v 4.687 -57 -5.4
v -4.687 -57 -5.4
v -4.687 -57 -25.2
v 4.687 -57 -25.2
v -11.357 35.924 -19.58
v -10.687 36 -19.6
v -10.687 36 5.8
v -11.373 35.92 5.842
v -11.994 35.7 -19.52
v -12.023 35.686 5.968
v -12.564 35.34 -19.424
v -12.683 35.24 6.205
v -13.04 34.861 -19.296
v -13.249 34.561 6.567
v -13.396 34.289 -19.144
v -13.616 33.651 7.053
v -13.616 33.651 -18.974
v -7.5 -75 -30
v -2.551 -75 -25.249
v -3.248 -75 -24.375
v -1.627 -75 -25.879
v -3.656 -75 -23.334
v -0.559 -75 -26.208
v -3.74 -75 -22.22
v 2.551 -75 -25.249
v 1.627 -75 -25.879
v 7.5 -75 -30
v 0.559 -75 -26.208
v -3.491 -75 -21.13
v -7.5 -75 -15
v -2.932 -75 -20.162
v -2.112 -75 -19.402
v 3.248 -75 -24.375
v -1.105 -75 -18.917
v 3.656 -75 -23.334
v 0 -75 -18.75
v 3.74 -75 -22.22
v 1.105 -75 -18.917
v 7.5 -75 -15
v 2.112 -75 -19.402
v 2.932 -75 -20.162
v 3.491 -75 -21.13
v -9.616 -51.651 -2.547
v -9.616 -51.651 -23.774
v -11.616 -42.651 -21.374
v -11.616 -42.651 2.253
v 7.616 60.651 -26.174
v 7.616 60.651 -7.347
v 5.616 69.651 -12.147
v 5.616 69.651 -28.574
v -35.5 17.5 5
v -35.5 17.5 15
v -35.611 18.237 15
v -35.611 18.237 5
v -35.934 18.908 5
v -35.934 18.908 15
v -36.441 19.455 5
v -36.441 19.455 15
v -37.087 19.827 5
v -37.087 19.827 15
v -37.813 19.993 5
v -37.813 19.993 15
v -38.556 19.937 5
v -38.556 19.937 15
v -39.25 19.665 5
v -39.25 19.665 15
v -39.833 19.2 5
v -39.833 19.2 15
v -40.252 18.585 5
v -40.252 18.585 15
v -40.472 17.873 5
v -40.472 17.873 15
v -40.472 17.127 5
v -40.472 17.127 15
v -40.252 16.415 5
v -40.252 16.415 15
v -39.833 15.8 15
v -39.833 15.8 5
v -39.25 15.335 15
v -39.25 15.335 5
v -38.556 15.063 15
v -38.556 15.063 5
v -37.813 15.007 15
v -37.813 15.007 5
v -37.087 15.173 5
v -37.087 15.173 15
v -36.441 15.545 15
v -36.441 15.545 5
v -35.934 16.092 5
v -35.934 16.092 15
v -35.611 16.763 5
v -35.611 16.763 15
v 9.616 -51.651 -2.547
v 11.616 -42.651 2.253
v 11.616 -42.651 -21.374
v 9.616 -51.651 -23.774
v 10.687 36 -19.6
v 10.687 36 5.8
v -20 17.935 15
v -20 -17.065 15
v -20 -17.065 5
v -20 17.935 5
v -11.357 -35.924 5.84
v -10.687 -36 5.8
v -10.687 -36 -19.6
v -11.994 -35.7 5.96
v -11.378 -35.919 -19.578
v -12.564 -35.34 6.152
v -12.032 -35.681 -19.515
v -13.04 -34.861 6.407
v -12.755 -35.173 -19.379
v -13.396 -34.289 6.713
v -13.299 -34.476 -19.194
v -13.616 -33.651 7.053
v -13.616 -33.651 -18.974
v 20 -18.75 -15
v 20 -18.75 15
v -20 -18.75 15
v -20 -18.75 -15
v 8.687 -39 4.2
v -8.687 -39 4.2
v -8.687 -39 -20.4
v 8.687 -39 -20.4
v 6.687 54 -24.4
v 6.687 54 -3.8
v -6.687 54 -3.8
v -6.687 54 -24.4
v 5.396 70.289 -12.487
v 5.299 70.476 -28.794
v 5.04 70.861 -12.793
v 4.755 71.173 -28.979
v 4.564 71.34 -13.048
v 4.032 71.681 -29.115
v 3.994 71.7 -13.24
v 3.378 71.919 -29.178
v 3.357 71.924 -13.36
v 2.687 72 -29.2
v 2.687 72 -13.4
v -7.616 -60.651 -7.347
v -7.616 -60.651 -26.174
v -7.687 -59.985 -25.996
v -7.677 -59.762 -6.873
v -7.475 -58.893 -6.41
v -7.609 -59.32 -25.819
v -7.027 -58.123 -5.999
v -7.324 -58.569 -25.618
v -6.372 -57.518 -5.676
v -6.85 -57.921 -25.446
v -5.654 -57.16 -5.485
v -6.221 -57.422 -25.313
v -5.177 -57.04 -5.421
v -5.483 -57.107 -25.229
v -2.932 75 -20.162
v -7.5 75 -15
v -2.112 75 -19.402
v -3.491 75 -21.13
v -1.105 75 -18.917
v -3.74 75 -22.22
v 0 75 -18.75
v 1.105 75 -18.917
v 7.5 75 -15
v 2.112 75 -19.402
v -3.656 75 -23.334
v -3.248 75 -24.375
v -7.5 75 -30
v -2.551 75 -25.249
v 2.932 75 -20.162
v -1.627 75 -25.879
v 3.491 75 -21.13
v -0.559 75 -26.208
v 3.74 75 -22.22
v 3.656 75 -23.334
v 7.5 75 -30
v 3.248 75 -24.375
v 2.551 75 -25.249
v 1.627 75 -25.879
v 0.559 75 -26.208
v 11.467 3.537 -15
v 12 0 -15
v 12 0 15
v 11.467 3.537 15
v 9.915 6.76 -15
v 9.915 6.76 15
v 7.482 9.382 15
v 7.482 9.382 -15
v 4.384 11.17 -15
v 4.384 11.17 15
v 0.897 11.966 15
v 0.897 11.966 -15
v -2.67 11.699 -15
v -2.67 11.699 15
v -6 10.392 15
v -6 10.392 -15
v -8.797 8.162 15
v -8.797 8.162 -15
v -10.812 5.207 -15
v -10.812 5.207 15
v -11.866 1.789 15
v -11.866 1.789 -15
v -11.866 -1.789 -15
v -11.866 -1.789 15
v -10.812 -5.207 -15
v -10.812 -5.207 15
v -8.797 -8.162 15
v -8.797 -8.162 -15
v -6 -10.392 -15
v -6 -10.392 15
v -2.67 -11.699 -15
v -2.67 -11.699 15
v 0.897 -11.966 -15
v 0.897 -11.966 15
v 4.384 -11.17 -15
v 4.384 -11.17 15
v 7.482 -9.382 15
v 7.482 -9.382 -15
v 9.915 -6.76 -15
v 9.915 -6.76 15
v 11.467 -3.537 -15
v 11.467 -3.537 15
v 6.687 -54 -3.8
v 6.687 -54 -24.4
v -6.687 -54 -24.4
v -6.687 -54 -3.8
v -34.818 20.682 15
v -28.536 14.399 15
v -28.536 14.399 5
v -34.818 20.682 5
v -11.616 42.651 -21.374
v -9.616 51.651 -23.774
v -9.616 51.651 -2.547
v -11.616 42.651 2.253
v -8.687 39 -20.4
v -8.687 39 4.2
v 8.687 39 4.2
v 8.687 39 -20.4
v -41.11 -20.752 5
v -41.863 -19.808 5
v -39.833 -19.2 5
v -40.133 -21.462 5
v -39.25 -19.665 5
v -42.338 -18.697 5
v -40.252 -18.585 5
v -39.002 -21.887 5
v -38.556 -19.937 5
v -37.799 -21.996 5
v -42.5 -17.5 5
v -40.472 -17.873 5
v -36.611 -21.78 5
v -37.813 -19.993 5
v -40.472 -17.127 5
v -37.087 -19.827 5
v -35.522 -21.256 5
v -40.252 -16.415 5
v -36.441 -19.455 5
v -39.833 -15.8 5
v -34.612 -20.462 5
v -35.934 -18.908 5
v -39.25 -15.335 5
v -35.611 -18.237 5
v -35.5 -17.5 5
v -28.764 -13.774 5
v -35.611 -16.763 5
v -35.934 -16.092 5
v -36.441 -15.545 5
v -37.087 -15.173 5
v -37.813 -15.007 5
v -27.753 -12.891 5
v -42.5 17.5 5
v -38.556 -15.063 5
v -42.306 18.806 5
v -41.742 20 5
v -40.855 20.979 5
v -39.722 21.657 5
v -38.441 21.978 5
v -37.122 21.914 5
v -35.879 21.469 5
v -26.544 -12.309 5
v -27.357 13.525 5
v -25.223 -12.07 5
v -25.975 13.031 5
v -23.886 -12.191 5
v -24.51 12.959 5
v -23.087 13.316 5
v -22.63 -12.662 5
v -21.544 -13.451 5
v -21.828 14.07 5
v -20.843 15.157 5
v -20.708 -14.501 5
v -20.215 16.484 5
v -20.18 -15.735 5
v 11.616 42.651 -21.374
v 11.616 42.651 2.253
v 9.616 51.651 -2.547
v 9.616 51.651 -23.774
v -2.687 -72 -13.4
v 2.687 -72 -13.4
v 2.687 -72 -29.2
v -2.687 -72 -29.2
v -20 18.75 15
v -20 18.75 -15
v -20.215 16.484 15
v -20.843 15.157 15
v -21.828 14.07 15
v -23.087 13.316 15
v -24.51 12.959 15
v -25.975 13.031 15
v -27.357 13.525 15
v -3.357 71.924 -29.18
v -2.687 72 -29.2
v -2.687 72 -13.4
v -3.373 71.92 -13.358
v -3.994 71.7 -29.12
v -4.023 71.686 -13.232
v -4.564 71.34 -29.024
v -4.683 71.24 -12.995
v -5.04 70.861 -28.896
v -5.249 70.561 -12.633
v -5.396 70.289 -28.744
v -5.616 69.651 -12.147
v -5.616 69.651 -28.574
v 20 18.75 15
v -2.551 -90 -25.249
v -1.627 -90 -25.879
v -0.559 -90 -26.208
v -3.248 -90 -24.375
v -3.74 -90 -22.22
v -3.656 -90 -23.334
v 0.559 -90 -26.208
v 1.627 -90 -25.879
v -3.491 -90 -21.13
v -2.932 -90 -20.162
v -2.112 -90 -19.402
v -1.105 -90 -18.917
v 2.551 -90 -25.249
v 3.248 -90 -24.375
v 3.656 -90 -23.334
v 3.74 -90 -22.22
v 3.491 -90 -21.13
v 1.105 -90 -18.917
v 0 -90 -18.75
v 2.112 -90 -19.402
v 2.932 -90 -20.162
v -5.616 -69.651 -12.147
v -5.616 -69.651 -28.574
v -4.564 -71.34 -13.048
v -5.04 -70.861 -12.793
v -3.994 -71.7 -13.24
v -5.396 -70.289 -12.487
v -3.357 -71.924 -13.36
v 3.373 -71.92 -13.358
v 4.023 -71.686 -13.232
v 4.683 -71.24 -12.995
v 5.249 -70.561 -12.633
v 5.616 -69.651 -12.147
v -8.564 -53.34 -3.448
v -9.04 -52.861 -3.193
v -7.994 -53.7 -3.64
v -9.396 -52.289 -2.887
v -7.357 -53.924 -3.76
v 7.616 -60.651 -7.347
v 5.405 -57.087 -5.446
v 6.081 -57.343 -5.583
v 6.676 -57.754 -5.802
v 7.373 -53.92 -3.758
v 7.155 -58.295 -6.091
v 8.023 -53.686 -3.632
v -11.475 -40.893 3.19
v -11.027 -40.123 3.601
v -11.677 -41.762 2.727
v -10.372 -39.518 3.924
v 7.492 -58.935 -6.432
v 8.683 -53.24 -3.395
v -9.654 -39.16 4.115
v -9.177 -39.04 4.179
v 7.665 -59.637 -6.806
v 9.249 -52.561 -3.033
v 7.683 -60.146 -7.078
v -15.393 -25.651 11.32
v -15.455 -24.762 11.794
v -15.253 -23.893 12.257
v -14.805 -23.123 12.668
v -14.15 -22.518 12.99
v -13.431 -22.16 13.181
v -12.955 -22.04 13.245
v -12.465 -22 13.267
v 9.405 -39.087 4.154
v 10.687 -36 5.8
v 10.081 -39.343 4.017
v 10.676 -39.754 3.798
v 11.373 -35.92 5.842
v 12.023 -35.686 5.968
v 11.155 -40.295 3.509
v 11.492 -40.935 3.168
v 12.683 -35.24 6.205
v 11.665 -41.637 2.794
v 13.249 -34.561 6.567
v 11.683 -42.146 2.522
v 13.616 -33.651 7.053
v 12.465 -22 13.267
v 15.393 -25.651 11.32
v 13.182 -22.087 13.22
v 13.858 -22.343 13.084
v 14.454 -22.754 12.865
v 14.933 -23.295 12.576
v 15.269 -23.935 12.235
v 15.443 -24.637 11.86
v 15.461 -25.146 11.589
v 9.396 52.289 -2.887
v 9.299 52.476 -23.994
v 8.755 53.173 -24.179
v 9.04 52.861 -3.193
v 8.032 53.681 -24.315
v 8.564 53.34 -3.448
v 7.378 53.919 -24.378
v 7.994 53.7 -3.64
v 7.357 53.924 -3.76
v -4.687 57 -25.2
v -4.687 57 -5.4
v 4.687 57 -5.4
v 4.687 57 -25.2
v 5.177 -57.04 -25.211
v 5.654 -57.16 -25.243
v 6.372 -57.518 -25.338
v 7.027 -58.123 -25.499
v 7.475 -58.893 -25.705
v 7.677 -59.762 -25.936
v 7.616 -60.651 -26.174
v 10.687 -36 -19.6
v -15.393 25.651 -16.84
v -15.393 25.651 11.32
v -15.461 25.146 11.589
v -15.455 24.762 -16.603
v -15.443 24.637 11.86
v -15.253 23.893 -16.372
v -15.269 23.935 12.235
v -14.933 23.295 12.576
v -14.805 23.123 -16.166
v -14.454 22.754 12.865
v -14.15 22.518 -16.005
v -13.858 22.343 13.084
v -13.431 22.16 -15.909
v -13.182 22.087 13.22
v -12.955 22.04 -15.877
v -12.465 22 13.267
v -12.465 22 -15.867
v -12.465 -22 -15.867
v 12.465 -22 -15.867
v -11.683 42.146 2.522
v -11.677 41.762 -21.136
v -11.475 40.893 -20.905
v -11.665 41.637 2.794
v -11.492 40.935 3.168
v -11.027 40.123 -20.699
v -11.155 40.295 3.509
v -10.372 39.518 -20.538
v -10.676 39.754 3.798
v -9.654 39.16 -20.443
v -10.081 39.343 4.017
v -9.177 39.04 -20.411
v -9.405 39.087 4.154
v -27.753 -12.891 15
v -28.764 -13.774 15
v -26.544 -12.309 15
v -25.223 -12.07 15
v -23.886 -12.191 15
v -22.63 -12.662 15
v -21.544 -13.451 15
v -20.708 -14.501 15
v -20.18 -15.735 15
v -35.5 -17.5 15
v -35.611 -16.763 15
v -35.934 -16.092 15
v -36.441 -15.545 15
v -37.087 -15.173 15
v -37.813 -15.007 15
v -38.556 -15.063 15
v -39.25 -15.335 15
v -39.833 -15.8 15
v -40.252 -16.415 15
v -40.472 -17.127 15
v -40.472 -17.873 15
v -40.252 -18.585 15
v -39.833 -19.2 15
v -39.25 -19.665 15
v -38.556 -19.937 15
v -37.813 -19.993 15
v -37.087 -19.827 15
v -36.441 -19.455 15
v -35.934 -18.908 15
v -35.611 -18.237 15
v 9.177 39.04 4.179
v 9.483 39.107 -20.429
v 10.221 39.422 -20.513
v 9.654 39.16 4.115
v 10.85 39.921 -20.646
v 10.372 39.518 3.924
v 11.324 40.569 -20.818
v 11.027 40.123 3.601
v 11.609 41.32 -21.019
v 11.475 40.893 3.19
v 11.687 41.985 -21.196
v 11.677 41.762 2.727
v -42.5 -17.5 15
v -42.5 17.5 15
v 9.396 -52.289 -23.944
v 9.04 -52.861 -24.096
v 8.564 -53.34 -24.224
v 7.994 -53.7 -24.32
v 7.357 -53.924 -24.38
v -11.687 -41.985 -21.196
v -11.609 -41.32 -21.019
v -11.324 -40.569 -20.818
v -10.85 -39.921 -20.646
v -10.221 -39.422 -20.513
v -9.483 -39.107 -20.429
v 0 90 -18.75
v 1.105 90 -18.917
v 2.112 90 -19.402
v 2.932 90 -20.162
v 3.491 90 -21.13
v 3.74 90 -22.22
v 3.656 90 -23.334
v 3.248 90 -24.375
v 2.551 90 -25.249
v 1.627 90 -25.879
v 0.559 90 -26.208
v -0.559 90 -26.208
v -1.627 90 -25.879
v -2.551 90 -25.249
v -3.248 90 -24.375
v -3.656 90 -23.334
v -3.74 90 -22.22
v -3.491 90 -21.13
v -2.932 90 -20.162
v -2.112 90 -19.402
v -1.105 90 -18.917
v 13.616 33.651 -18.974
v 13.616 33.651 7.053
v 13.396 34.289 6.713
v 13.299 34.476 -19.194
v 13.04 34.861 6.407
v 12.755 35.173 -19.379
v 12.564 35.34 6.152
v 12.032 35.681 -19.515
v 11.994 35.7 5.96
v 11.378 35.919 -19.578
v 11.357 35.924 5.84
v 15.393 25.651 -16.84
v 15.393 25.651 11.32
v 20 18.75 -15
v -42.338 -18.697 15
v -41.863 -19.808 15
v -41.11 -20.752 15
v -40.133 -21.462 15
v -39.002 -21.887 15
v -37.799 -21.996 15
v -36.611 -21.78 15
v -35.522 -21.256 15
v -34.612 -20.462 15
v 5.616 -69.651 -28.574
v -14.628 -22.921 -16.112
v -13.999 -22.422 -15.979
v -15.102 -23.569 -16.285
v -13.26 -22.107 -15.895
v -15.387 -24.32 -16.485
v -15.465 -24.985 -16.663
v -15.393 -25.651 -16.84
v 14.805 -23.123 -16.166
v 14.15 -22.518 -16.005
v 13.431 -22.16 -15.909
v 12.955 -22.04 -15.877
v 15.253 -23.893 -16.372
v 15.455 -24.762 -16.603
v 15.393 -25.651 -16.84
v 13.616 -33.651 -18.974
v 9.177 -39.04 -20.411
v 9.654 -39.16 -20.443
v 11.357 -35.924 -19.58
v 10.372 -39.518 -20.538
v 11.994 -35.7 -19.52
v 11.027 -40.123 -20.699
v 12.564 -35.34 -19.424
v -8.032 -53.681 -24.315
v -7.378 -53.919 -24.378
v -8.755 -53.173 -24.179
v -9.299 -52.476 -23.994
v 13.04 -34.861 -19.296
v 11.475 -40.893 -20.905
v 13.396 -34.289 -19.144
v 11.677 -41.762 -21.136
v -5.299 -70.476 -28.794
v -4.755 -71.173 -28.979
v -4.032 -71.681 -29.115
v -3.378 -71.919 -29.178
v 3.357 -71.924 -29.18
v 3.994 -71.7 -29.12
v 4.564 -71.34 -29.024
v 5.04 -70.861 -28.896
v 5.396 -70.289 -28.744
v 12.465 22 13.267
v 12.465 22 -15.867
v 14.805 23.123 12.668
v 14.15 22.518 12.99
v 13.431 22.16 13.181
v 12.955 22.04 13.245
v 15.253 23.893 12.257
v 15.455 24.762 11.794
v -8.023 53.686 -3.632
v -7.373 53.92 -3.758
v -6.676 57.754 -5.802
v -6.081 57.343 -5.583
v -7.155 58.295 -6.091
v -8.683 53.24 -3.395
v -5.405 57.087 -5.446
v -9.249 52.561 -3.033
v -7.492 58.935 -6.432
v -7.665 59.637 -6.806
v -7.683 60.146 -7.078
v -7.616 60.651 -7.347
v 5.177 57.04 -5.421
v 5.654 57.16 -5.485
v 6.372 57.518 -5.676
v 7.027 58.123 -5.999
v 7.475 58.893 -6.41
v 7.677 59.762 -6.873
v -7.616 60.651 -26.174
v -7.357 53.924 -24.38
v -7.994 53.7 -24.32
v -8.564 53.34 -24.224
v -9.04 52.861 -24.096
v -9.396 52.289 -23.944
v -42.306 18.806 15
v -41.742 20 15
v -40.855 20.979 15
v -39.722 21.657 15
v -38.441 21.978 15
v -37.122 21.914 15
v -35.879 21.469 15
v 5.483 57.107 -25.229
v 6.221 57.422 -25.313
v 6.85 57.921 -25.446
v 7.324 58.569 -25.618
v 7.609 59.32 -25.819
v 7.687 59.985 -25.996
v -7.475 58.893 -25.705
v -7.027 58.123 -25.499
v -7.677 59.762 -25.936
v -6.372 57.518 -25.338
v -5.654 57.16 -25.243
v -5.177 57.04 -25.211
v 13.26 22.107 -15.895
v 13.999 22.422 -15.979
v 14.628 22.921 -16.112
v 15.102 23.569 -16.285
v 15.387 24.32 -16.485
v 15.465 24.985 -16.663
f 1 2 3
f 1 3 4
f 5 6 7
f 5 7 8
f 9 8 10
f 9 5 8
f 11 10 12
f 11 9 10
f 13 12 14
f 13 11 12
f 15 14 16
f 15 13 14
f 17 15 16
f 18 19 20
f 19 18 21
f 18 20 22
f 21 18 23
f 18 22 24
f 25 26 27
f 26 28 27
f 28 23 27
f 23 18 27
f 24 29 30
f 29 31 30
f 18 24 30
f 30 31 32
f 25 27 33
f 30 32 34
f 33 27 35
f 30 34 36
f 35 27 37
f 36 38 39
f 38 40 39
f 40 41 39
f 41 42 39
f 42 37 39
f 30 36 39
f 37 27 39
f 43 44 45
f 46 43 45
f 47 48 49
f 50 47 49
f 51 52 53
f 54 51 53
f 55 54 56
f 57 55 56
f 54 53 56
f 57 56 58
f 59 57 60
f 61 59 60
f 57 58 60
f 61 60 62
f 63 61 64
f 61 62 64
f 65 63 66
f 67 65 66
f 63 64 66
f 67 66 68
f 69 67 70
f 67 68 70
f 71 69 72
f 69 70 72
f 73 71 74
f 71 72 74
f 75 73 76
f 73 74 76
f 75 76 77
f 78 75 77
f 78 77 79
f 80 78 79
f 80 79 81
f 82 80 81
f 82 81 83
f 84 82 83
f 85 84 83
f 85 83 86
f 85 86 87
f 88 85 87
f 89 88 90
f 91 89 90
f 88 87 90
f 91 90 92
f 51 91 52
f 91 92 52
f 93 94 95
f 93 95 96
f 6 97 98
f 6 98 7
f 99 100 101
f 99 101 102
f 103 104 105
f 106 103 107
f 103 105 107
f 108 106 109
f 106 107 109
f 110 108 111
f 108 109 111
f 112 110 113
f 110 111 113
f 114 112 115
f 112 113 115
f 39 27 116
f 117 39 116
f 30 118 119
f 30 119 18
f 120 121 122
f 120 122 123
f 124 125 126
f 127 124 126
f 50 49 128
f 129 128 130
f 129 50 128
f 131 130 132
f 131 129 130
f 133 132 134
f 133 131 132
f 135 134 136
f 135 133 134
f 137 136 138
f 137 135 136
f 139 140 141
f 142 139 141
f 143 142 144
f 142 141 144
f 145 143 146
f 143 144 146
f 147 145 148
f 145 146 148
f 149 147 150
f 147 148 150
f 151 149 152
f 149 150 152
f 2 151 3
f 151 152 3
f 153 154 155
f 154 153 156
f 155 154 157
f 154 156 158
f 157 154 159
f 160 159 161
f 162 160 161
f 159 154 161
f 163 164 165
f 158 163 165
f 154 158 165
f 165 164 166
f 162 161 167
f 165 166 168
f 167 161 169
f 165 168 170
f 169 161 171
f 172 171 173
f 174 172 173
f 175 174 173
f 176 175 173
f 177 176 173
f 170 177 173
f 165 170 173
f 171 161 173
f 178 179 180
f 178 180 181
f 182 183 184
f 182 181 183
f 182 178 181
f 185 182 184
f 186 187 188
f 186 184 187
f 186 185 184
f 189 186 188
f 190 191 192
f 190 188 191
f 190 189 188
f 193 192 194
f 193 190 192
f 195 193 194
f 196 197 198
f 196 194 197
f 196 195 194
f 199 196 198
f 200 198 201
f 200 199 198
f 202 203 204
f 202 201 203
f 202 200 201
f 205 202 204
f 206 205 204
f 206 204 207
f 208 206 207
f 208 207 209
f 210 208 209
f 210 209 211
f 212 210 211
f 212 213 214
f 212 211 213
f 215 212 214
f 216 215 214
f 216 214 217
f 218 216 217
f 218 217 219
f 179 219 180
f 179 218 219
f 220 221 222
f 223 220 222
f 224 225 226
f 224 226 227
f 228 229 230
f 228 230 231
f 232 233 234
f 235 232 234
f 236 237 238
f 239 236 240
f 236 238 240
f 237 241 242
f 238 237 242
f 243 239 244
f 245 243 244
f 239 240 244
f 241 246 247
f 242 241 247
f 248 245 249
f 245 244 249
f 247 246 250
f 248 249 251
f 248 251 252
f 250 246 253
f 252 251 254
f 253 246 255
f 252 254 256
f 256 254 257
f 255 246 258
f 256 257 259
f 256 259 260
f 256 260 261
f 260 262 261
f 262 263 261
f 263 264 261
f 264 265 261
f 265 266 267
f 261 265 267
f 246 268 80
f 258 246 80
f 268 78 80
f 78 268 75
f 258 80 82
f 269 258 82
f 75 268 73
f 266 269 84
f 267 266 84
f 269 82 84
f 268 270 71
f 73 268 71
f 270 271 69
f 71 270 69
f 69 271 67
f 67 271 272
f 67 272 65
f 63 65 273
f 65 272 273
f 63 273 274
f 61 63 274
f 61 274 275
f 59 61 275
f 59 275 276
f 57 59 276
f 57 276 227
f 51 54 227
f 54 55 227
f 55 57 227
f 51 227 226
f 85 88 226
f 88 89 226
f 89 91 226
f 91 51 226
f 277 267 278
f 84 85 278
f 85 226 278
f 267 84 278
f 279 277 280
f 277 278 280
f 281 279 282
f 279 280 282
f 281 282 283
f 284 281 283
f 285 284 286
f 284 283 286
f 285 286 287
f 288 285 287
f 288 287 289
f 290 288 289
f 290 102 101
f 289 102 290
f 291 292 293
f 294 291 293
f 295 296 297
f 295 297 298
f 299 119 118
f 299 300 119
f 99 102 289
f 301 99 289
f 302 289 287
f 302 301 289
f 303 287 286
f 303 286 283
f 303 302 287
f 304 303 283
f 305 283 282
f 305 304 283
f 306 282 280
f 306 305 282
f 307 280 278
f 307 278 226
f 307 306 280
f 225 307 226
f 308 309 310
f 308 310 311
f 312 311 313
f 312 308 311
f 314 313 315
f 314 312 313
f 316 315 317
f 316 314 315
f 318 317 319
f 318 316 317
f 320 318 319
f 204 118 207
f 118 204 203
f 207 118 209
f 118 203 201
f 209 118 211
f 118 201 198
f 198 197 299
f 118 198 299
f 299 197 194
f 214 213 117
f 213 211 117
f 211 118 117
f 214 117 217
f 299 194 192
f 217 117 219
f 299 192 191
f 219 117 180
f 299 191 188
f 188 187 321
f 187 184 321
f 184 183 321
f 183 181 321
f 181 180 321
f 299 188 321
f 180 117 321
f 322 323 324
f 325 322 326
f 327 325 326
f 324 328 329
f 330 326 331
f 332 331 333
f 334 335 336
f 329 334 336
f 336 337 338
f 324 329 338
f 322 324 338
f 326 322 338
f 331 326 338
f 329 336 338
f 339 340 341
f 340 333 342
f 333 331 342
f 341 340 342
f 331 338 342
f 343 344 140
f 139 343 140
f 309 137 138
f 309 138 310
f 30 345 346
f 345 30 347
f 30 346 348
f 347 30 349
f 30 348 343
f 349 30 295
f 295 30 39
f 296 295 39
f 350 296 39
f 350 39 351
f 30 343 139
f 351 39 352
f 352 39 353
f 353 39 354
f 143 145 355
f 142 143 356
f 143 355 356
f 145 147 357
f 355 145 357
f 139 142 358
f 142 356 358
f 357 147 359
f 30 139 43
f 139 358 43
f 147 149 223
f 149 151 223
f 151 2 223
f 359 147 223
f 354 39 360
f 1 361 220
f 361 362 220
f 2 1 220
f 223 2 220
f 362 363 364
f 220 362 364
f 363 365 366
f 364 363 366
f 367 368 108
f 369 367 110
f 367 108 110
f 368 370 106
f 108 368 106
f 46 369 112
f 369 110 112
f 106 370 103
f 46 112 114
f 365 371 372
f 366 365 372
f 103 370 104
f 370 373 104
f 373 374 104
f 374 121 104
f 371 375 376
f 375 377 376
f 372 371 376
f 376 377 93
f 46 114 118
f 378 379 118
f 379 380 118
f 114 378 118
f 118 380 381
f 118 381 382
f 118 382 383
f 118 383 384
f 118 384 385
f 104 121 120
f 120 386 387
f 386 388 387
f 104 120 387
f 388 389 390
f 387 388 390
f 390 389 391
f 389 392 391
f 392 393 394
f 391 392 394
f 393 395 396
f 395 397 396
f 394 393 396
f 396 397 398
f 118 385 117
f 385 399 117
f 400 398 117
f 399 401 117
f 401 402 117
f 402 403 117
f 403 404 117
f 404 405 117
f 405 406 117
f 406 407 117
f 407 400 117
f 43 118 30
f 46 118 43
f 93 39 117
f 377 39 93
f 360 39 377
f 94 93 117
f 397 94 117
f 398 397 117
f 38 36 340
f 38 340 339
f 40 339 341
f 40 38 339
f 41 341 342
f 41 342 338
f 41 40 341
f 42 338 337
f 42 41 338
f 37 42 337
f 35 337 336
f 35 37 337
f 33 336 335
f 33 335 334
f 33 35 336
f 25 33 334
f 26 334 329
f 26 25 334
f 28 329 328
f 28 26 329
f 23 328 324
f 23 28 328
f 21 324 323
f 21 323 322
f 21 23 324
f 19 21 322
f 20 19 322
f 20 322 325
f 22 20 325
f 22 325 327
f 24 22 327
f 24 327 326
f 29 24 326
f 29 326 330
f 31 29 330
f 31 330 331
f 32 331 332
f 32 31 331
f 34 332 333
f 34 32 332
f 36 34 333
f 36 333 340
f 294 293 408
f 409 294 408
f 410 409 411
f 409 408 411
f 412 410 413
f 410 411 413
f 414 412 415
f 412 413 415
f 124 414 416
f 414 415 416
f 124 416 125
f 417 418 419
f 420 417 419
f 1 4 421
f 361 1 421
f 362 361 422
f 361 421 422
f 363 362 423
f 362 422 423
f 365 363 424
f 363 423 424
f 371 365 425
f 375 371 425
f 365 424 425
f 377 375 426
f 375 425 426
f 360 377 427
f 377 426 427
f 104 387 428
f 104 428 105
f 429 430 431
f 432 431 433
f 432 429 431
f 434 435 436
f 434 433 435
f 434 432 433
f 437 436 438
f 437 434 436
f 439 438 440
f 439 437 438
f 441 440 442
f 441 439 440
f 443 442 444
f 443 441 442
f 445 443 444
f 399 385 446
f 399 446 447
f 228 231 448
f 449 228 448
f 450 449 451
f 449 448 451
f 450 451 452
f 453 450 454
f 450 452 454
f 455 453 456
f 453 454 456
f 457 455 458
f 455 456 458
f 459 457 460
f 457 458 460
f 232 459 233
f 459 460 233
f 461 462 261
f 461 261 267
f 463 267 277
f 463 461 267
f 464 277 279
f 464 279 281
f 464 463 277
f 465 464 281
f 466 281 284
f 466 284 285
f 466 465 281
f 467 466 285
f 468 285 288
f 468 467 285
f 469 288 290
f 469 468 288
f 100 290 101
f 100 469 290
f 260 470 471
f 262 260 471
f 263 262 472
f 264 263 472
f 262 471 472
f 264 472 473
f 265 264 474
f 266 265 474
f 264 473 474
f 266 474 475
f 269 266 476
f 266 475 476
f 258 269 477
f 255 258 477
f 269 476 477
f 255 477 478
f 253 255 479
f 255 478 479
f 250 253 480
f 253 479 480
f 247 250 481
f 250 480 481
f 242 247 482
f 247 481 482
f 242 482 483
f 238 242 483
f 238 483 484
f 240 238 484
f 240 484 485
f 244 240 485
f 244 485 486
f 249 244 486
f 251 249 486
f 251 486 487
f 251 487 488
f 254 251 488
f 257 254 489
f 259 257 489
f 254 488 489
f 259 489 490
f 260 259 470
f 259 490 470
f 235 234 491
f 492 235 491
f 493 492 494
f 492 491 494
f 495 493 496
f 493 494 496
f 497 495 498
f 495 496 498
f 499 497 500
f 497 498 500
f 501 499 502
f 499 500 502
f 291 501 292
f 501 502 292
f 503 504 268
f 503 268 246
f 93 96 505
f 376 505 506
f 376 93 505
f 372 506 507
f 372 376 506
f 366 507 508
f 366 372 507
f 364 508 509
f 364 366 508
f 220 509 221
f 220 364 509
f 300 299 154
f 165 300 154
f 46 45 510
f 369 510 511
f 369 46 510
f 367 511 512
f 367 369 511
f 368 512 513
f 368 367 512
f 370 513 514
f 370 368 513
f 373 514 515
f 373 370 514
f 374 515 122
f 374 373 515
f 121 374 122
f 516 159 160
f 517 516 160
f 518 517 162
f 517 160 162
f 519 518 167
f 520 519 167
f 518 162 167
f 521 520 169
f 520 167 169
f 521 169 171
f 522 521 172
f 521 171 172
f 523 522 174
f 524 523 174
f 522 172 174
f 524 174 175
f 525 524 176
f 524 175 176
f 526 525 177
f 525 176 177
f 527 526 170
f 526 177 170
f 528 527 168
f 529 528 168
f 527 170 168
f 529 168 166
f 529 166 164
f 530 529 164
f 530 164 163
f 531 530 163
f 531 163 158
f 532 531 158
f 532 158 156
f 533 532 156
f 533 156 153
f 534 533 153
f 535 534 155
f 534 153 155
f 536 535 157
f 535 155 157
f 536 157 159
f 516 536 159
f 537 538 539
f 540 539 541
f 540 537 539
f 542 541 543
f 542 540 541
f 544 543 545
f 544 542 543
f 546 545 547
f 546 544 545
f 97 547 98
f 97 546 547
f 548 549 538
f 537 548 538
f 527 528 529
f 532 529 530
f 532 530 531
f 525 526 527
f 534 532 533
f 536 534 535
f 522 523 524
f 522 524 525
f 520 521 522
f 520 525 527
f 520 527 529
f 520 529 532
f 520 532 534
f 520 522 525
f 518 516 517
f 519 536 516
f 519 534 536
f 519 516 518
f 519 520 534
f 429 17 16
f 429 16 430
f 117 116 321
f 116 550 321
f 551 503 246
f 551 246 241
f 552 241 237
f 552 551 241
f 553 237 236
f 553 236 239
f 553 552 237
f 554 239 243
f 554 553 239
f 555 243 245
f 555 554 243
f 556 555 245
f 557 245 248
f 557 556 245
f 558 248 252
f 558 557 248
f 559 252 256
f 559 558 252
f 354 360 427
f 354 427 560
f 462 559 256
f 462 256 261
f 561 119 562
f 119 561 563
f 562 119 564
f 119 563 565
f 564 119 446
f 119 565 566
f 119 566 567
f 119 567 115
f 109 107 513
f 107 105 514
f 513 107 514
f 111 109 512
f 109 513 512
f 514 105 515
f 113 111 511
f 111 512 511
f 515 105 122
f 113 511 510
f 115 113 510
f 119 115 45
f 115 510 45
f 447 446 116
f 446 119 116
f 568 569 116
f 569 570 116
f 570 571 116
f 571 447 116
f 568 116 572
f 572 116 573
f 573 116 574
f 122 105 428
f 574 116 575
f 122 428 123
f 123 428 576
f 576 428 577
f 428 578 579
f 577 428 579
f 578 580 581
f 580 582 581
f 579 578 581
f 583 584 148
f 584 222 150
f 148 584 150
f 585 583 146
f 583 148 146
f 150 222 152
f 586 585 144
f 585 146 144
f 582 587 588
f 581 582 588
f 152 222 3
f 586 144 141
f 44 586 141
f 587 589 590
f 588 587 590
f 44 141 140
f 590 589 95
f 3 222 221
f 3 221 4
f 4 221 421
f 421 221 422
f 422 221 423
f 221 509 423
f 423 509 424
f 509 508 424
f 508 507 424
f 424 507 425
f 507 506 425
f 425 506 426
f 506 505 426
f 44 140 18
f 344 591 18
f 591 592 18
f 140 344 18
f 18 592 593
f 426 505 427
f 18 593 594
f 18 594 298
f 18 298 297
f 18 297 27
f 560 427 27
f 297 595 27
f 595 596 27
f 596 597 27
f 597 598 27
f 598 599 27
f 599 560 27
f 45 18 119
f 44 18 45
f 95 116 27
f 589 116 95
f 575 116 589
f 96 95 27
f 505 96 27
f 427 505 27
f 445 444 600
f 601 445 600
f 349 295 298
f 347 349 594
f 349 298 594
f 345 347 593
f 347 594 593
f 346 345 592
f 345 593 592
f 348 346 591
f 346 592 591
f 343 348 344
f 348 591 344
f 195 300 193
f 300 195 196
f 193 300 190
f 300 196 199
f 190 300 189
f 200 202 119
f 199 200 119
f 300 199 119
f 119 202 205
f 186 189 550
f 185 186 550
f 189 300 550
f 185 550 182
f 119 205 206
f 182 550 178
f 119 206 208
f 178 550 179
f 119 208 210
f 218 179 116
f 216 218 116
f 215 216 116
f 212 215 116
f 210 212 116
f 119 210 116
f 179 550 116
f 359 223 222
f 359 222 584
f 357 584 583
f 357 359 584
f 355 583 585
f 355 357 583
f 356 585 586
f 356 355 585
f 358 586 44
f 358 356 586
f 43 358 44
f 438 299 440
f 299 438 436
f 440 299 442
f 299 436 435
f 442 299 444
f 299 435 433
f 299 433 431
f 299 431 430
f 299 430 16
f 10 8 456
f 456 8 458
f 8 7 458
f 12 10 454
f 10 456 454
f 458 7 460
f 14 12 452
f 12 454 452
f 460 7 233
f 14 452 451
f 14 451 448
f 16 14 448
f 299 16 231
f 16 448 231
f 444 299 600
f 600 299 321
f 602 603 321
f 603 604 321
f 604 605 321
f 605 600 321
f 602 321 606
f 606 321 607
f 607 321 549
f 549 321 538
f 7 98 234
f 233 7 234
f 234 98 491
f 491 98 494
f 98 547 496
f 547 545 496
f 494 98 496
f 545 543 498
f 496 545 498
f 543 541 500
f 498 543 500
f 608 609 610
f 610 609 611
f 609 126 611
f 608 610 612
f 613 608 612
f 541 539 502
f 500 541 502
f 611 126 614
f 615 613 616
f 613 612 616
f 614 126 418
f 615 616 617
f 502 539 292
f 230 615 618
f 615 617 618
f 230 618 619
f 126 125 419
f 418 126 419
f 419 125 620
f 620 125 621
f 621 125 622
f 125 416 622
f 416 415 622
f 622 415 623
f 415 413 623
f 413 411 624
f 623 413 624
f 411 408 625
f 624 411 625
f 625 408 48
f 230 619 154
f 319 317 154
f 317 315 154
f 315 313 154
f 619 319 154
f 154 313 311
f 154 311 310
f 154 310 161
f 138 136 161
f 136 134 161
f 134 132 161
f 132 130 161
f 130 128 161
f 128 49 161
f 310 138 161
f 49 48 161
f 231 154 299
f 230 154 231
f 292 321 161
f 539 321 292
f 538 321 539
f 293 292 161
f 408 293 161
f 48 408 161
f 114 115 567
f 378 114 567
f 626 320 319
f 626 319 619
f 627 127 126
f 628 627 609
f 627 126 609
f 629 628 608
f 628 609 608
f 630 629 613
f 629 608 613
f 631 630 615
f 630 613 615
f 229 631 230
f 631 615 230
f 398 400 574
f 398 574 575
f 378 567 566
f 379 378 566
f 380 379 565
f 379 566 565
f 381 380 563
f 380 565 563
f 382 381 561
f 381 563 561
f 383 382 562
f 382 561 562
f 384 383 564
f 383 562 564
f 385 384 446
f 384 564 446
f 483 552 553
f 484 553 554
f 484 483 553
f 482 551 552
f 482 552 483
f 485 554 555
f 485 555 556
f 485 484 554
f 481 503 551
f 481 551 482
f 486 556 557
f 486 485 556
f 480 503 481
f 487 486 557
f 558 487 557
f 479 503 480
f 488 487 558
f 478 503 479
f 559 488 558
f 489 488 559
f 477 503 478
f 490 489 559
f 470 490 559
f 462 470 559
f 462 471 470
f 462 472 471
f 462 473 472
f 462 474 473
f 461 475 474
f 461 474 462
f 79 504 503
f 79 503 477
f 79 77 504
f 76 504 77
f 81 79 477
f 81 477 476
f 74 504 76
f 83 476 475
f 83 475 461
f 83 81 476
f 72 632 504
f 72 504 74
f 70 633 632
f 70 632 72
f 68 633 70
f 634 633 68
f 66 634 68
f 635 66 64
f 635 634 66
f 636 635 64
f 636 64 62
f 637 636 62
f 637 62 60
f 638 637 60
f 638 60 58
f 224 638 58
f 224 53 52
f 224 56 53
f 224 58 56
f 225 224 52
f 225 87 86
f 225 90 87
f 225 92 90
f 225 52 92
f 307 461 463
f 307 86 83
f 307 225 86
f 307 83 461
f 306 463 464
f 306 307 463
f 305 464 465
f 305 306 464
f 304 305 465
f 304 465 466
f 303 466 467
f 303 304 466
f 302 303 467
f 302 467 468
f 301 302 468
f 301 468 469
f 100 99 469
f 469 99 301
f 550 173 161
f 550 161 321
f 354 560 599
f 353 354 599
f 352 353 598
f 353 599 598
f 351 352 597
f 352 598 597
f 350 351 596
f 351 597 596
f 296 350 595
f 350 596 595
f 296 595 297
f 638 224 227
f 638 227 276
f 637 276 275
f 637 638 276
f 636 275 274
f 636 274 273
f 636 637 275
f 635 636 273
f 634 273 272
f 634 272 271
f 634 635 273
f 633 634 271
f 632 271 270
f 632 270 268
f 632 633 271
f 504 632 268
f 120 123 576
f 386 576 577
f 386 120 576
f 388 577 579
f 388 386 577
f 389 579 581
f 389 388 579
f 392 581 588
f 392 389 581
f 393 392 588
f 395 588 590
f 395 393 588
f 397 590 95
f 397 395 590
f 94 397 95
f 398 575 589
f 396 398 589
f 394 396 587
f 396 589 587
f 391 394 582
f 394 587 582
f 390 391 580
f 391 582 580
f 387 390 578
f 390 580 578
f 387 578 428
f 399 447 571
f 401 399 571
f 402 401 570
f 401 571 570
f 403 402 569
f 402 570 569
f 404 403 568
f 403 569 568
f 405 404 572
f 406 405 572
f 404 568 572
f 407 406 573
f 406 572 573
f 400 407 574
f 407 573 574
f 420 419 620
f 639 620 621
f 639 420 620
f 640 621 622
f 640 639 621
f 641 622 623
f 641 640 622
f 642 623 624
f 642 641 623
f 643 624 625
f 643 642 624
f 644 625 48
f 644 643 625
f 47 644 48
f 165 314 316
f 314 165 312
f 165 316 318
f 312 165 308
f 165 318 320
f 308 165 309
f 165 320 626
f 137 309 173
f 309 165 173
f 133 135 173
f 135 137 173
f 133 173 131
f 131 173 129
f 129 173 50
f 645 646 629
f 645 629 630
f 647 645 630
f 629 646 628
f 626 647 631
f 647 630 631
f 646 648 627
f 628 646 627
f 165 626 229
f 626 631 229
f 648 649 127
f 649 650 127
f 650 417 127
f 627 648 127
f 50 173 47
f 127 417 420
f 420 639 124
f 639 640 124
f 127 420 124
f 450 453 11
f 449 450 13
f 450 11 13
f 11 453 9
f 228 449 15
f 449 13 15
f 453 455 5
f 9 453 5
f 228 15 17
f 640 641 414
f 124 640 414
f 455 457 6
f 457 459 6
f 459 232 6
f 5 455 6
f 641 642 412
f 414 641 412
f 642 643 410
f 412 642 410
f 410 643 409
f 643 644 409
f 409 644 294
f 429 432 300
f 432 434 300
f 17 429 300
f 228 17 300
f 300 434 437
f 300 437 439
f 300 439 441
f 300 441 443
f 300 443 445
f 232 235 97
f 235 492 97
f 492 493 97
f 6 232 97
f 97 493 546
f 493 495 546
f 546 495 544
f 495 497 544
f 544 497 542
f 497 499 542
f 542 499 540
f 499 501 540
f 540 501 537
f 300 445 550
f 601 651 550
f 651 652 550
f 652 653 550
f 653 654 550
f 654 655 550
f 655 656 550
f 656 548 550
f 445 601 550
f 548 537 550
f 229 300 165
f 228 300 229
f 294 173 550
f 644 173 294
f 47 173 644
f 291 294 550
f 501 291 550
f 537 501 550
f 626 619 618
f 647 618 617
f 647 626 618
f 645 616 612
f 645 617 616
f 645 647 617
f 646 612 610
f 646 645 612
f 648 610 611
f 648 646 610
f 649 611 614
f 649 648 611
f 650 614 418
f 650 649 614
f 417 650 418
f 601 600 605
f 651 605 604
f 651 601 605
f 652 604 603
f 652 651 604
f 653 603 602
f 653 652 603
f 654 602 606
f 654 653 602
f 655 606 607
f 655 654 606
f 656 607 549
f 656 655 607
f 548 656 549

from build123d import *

# Parameters (mm, degrees)
BOSS_EXTRUDE1_DEPTH     = 20
CUT_EXTRUDE1_DEPTH      = 90.721792225
CUT_EXTRUDE1_DEPTH_BACK = 90.721792225
SKETCH2_R               = 12
SKETCH3_R               = 2.5
BOSS_EXTRUDE2_DEPTH     = 10
SKETCH5_R               = 3.75
BOSS_EXTRUDE3_DEPTH     = 15
CUT_EXTRUDE2_DEPTH      = 110.230261375
CUT_EXTRUDE3_DEPTH      = 104.953114431


with BuildPart() as part:
    # Sketch1 → Boss-Extrude1 (new, symmetric)
    with BuildSketch(Plane(origin=(0, 0, 0), x_dir=(0, 0, -1), z_dir=(1, 0, 0))):
        Polygon((-15, -18.75), (-15, 18.75), (15, 75), (30, 75), (15, 18.75), (15, -18.75), (30, -75), (15, -75), align=None)
    extrude(amount=BOSS_EXTRUDE1_DEPTH, both=True)

    # Sketch2 → Cut-Extrude1 (cut, two sides: drawn at the far end of the back side and taken through both)
    with BuildSketch(Plane.XY.offset(15).offset(-CUT_EXTRUDE1_DEPTH_BACK)):
        Circle(SKETCH2_R)
    extrude(amount=CUT_EXTRUDE1_DEPTH + CUT_EXTRUDE1_DEPTH_BACK, mode=Mode.SUBTRACT)

    # Sketch5 → Boss-Extrude3 (add)
    with BuildSketch(Plane(origin=(0, 75, 0), x_dir=(1, 0, 0), z_dir=(0, 1, 0))):
        with Locations(Location((0, 22.5, 0), (0, 0, 270))):
            Circle(SKETCH5_R)
    boss_extrude3 = extrude(amount=BOSS_EXTRUDE3_DEPTH)

    # Mirror1: Boss-Extrude3 across plane
    add(boss_extrude3.mirror(Plane.ZX))

    # Sketch6 → Cut-Extrude2 (cut, symmetric)
    with BuildSketch(Plane.XY.offset(15)):
        Polygon((20, 18.75), (20, 75), (7.5, 75), align=None)
        Polygon((-20, 75), (-20, 18.75), (-7.5, 75), align=None)
    cut_extrude2 = extrude(amount=CUT_EXTRUDE2_DEPTH, both=True, mode=Mode.SUBTRACT)

    # Mirror2: Cut-Extrude2 across plane
    add(cut_extrude2.mirror(Plane.ZX), mode=Mode.SUBTRACT)

    # Sketch7 → Cut-Extrude3 (cut, symmetric)
    with BuildSketch(Plane.XY):
        with BuildLine():
            Line((-12.46474814, 22), (12.46474814, 22))
            ThreePointArc((12.46474814, 22), (14.804873576, 23.122817819), (15.39330932, 25.650791373))
            Line((15.39330932, 25.650791373), (13.615531542, 33.650791373))
            ThreePointArc((13.615531542, 33.650791373), (12.564152543, 35.340125437), (10.686970362, 36))
            Line((10.686970362, 36), (-10.686970362, 36))
            ThreePointArc((-10.686970362, 36), (-12.564152543, 35.340125437), (-13.615531542, 33.650791373))
            Line((-13.615531542, 33.650791373), (-15.39330932, 25.650791373))
            ThreePointArc((-15.39330932, 25.650791373), (-14.804873576, 23.122817819), (-12.46474814, 22))
        make_face()
        with BuildLine():
            Line((2.686970362, 72), (-2.686970362, 72))
            ThreePointArc((-2.686970362, 72), (-4.564152543, 71.340125437), (-5.615531542, 69.650791373))
            Line((-5.615531542, 69.650791373), (-7.615531542, 60.650791373))
            ThreePointArc((-7.615531542, 60.650791373), (-7.027095799, 58.122817819), (-4.686970362, 57))
            Line((-4.686970362, 57), (4.686970362, 57))
            ThreePointArc((4.686970362, 57), (7.027095799, 58.122817819), (7.615531542, 60.650791373))
            Line((7.615531542, 60.650791373), (5.615531542, 69.650791373))
            ThreePointArc((5.615531542, 69.650791373), (4.564152543, 71.340125437), (2.686970362, 72))
        make_face()
        with BuildLine():
            Line((-8.686970362, 39), (8.686970362, 39))
            ThreePointArc((8.686970362, 39), (11.027095799, 40.122817819), (11.615531542, 42.650791373))
            Line((11.615531542, 42.650791373), (9.615531542, 51.650791373))
            ThreePointArc((9.615531542, 51.650791373), (8.564152543, 53.340125437), (6.686970362, 54))
            Line((6.686970362, 54), (-6.686970362, 54))
            ThreePointArc((-6.686970362, 54), (-8.564152543, 53.340125437), (-9.615531542, 51.650791373))
            Line((-9.615531542, 51.650791373), (-11.615531542, 42.650791373))
            ThreePointArc((-11.615531542, 42.650791373), (-11.027095799, 40.122817819), (-8.686970362, 39))
        make_face()
    cut_extrude3 = extrude(amount=CUT_EXTRUDE3_DEPTH, both=True, mode=Mode.SUBTRACT)

    # Mirror3: Cut-Extrude3 across plane
    add(cut_extrude3.mirror(Plane.ZX), mode=Mode.SUBTRACT)


with BuildPart() as body_2:
    # Sketch3 → Boss-Extrude2 (new body)
    with BuildSketch(Plane.XY.offset(15)):
        with BuildLine():
            ThreePointArc((-20, 17.935028843), (-23.086582838, 13.31563118), (-28.535533906, 14.399494937))
            Line((-28.535533906, 14.399494937), (-34.818019485, 20.681980515))
            ThreePointArc((-34.818019485, 20.681980515), (-39.722075446, 21.657457896), (-42.5, 17.5))
            Line((-42.5, 17.5), (-42.5, -17.5))
            ThreePointArc((-42.5, -17.5), (-39.582065715, -21.712726916), (-34.61241419, -20.462138143))
            Line((-34.61241419, -20.462138143), (-28.763984233, -13.773706554))
            ThreePointArc((-28.763984233, -13.773706554), (-23.242149205, -12.384163473), (-20, -17.064971157))
            Line((-20, -17.064971157), (-20, 17.935028843))
        make_face()
        with Locations((-38, -17.5)):
            Circle(SKETCH3_R, mode=Mode.SUBTRACT)
        with Locations((-38, 17.5)):
            Circle(SKETCH3_R, mode=Mode.SUBTRACT)
    extrude(amount=-BOSS_EXTRUDE2_DEPTH)


solid = Compound([part.part, body_2.part])
